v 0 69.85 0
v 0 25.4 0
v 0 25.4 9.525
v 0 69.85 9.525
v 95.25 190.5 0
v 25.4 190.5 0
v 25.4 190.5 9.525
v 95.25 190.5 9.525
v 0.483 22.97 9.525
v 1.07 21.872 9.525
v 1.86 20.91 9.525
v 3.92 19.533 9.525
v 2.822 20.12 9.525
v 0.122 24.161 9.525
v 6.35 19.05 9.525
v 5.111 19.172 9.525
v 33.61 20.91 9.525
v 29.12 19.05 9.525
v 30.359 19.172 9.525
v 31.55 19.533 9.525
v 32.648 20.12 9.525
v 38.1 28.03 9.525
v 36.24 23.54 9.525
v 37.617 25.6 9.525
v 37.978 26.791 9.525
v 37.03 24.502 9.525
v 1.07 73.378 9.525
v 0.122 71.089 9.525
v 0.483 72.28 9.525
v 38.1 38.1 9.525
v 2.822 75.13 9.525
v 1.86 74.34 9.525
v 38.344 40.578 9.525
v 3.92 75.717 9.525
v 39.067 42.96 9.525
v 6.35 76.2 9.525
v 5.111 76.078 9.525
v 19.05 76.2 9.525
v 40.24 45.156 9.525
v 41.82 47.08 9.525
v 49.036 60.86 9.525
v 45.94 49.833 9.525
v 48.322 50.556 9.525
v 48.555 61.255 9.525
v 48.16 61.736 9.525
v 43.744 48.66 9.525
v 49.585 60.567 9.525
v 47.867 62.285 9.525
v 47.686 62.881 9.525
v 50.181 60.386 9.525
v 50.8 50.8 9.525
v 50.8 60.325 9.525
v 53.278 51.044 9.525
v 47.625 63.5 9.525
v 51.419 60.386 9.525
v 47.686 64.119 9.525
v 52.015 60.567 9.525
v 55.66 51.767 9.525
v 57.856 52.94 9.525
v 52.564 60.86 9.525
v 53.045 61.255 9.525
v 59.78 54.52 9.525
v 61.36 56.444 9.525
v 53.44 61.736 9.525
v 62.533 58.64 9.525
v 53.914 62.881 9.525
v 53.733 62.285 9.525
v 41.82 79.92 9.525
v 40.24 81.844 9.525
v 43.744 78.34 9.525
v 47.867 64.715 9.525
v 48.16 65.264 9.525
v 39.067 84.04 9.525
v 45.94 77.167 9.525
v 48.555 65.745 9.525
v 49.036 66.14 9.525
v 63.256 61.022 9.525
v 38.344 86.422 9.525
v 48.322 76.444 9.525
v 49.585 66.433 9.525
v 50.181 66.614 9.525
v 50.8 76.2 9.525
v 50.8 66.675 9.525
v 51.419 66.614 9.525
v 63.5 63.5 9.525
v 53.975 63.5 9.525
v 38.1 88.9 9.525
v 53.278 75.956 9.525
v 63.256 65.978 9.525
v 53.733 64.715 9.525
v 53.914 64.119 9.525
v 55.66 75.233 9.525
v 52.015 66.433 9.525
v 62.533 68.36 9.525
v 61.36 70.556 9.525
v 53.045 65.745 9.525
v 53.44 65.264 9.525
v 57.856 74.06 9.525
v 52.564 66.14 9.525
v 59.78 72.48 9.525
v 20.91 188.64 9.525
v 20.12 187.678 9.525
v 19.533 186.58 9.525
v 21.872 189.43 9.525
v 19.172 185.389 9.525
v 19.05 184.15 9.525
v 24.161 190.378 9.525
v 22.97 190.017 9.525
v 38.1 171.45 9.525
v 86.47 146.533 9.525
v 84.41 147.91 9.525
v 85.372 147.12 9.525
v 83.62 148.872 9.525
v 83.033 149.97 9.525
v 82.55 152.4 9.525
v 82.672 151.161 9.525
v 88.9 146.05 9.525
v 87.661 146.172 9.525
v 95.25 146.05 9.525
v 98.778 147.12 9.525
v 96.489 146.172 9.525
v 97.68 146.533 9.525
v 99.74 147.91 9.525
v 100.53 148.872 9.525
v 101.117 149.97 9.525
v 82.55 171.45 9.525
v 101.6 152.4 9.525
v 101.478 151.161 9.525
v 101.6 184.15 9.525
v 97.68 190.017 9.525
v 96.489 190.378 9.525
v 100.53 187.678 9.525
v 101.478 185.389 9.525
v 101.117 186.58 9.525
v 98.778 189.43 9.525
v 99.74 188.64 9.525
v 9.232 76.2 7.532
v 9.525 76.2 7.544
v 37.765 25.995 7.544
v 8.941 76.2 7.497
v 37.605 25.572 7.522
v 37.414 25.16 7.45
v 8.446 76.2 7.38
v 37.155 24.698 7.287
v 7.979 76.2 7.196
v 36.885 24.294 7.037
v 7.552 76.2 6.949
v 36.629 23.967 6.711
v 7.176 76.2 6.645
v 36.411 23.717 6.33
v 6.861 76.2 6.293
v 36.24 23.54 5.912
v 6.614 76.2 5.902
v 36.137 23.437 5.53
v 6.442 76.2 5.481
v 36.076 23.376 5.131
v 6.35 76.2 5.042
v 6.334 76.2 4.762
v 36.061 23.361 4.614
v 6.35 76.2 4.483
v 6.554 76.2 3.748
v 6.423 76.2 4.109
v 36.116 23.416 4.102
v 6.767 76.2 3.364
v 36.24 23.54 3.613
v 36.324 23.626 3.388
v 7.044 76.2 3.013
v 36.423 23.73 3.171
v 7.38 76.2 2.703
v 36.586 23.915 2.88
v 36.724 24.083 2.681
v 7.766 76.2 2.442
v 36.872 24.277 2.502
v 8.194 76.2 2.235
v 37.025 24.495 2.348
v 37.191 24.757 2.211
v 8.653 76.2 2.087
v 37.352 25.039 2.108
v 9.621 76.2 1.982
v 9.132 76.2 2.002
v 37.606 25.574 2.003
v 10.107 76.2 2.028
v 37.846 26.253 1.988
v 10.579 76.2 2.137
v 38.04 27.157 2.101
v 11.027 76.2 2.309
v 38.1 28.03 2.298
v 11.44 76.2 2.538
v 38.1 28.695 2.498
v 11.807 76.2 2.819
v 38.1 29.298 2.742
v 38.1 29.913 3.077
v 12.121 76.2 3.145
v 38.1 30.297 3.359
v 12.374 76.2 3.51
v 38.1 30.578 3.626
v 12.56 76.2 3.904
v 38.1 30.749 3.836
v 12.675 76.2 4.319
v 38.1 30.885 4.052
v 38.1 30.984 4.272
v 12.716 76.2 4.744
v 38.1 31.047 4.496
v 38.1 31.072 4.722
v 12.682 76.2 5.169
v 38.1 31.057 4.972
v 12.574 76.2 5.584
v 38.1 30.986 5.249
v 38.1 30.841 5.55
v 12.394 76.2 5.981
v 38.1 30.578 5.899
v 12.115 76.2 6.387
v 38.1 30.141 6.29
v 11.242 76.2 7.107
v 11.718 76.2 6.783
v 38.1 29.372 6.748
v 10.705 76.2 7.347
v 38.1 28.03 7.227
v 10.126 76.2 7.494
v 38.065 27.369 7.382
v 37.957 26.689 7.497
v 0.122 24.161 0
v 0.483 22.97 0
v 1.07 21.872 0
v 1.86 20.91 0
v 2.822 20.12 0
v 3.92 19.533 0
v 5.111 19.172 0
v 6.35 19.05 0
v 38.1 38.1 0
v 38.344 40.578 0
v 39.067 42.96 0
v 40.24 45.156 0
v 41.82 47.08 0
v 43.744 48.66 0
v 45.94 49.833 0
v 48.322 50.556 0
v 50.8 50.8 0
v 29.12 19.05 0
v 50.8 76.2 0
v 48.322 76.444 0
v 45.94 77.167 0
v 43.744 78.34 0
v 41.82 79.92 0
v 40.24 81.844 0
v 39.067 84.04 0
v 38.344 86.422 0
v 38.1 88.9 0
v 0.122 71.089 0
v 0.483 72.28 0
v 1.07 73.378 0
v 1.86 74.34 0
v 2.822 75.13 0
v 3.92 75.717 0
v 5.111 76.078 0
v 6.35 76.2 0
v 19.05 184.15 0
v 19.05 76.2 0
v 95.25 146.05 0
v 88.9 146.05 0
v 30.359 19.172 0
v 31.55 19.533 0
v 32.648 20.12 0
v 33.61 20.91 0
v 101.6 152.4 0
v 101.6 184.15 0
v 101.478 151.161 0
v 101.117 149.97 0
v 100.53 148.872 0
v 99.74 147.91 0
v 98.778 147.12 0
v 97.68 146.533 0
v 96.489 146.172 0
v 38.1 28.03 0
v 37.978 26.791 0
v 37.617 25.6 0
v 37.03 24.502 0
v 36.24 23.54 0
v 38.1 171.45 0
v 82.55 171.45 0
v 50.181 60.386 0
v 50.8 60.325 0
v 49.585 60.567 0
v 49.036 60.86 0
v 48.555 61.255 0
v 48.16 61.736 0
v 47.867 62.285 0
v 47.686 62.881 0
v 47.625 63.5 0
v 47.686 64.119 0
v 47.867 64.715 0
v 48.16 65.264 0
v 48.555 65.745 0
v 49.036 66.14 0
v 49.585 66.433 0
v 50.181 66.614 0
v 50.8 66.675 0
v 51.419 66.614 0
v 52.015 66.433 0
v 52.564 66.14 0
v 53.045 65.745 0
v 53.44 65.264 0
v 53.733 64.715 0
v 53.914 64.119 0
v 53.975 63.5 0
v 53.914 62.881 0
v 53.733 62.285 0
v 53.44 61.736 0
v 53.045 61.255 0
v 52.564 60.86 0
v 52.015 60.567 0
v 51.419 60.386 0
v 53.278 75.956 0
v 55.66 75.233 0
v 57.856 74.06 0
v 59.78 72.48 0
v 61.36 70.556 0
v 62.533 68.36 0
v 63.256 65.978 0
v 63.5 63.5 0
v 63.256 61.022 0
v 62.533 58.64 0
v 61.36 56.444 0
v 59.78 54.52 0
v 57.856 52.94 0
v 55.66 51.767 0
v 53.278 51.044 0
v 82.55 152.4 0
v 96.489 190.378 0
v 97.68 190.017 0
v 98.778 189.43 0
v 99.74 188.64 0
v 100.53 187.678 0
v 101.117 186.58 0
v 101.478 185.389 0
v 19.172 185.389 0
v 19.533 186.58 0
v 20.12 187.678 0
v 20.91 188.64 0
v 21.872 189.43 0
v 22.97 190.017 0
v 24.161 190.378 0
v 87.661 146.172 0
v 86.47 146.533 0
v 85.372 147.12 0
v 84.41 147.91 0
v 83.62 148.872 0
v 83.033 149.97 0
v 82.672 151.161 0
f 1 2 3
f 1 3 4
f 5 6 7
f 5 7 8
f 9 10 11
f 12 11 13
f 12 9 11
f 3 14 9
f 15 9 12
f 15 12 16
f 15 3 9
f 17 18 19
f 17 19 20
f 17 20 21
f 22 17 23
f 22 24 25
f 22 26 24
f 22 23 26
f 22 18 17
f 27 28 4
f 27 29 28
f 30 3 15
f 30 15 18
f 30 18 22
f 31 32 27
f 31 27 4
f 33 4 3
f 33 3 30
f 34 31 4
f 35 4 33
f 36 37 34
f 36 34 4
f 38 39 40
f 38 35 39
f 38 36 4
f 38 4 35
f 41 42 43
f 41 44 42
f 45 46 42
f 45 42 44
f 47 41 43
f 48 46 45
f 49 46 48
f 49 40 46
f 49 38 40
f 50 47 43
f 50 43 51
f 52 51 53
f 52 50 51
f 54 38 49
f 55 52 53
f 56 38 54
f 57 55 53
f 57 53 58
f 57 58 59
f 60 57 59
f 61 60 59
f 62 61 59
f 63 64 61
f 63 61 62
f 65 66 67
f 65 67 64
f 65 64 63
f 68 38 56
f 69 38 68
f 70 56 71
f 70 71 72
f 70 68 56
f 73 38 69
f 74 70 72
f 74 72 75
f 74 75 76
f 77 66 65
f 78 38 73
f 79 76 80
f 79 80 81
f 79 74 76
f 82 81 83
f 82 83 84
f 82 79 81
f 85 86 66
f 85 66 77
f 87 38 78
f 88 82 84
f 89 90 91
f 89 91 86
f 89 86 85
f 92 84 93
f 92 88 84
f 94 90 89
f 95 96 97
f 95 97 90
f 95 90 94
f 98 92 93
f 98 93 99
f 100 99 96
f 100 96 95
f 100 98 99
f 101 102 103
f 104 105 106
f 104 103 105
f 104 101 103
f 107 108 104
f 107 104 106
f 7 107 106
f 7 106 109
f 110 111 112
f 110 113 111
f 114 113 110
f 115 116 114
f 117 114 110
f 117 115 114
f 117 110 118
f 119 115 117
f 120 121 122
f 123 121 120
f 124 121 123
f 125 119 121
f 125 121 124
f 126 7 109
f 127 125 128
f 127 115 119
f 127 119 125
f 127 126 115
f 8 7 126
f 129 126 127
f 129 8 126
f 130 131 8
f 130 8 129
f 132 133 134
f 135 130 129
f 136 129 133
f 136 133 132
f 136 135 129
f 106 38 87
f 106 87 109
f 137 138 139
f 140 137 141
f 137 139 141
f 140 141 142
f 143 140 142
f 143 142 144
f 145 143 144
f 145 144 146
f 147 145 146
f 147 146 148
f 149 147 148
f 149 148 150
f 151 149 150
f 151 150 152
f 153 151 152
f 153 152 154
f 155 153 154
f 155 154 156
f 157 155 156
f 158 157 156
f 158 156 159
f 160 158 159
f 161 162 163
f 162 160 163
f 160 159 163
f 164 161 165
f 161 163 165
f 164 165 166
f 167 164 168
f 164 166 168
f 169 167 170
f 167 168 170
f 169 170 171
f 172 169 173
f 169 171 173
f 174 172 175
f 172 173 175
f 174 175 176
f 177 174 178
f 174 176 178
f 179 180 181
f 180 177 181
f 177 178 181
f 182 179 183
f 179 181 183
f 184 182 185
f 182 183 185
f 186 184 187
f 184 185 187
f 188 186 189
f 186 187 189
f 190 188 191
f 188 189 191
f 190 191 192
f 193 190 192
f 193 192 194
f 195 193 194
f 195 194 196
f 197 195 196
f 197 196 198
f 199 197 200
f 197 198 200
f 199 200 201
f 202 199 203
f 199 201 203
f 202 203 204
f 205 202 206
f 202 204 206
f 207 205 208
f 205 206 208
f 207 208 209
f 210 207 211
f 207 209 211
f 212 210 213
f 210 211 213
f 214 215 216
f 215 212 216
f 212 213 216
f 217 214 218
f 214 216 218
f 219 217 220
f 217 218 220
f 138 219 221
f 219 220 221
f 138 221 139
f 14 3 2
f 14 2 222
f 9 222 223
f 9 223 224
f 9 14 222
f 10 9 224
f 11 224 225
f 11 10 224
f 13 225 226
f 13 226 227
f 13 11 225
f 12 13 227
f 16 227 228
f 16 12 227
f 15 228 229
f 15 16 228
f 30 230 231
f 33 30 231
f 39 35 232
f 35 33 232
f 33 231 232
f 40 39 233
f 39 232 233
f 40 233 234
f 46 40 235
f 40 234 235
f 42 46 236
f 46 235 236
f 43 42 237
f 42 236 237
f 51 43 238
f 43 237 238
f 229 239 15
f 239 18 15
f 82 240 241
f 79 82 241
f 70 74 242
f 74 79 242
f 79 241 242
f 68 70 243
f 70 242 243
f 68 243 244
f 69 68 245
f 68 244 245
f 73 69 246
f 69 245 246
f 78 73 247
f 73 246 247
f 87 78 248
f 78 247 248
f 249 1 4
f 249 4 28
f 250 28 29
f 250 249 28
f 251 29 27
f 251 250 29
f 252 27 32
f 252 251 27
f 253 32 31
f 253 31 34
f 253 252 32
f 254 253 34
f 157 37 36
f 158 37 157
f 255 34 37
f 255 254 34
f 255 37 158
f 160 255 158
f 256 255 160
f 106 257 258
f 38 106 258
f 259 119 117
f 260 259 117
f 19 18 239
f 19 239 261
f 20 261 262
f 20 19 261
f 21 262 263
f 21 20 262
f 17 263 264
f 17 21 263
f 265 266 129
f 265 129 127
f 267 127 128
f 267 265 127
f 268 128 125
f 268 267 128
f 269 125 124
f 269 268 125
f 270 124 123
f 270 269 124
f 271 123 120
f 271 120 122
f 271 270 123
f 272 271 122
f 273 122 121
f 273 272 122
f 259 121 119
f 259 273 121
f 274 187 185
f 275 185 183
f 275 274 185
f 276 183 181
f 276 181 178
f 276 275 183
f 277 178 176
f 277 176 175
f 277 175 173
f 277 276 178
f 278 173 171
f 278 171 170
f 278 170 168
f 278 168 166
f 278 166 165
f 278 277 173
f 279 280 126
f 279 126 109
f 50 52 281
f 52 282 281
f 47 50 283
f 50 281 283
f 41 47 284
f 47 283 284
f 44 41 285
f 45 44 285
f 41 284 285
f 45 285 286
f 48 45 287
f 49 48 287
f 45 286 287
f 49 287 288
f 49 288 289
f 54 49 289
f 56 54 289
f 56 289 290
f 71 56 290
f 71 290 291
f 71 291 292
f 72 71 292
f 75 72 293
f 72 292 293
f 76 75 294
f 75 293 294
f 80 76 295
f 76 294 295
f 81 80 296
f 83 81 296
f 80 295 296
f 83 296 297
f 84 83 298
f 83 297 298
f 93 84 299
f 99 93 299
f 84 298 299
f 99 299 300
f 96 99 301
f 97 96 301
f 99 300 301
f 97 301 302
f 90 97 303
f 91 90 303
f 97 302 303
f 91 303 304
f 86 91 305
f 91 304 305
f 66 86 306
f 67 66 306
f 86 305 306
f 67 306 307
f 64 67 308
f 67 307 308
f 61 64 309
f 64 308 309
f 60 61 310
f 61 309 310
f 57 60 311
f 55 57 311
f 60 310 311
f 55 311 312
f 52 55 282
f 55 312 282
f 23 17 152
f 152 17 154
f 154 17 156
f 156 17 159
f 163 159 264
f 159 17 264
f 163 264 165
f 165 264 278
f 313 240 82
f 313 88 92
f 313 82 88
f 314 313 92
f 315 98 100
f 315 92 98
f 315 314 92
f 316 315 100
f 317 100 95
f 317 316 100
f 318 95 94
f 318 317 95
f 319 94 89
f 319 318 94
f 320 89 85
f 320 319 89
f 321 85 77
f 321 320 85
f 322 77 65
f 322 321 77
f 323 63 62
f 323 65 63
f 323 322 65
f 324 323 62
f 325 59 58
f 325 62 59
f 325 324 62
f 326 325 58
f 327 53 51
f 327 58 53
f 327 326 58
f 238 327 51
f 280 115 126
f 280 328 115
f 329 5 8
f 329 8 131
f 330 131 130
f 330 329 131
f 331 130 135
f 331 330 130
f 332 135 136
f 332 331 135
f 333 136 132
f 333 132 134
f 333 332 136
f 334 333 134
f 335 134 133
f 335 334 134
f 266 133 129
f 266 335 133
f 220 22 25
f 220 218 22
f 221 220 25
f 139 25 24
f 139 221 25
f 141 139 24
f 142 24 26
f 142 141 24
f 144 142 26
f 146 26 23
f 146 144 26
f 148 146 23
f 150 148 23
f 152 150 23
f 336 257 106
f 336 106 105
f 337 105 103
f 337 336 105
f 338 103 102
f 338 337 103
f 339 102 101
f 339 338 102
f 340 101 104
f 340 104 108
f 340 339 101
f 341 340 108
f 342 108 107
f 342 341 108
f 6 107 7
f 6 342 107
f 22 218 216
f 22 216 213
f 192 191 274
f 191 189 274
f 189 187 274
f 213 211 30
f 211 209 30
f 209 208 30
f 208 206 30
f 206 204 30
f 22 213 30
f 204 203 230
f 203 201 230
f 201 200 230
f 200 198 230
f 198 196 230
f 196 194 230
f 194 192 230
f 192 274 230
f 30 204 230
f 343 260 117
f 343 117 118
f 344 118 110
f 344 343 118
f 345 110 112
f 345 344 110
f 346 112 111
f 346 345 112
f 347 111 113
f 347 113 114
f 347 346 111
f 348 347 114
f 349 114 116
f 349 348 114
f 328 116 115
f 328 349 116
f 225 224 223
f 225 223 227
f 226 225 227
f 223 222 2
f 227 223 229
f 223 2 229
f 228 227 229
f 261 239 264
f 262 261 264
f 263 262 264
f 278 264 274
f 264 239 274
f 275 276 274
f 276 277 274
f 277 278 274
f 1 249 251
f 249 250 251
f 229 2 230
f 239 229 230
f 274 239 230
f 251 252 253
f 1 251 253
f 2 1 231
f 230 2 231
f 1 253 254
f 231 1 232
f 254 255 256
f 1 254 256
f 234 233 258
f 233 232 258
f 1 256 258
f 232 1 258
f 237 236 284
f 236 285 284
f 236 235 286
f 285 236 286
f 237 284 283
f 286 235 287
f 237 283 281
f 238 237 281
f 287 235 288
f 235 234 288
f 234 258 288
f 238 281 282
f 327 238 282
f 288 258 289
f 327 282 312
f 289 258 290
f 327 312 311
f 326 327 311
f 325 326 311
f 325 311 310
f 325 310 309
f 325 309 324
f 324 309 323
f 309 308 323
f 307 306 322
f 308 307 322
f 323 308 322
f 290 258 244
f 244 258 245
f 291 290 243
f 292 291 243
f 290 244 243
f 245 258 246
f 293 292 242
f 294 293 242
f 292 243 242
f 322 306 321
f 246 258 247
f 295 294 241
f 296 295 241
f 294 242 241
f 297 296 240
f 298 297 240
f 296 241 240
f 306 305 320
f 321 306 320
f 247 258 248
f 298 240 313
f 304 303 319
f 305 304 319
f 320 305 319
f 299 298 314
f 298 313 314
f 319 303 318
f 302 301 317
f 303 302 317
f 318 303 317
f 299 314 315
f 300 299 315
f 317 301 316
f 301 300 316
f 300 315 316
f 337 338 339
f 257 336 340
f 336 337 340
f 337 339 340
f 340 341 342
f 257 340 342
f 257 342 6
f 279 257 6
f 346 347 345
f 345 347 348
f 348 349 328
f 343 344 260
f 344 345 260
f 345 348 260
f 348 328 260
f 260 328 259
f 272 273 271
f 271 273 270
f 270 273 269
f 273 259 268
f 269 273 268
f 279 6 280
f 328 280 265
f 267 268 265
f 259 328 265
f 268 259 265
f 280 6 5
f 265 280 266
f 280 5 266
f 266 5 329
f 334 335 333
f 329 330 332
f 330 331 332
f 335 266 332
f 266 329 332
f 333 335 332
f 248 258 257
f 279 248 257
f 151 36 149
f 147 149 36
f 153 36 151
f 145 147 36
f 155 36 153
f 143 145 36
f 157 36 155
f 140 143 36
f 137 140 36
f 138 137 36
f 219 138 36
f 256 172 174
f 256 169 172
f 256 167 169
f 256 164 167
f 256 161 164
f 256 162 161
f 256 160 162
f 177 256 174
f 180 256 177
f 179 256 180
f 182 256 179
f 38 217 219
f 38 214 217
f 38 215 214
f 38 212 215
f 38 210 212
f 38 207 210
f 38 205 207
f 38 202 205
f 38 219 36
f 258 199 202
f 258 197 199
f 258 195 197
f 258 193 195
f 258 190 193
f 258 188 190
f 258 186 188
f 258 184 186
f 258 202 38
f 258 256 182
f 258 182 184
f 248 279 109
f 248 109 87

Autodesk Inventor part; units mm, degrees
ref_plane "YZ Plane" through (0, 0, 0) normal (1, 0, 0) x (0, 1, 0)
ref_plane "XZ Plane" through (0, 0, 0) normal (0, 1, 0) x (-1, 0, 0)
sketch "Sketch1" plane through (0, 0, 0) normal (0, 0, 1) x (1, 0, 0)
  line L0 (0, 0) -> (12.7, 0)
  line L1 (12.7, 0) -> (38.1, 25.4)
  line L2 (38.1, 25.4) -> (38.1, 38.1)
  arc A0 (50.8, 50.8) -> (38.1, 38.1) centre (50.8, 38.1) ccw
  line L3 (0, 0) -> (0, 76.2)
  line L4 (0, 76.2) -> (19.05, 76.2)
  line L5 (19.05, 190.5) -> (19.05, 76.2)
  line L6 (38.1, 171.45) -> (38.1, 88.9)
  arc A1 (50.8, 50.8) -> (50.8, 76.2) centre (50.8, 63.5) ccw
  arc A2 (38.1, 88.9) -> (50.8, 76.2) centre (50.8, 88.9) ccw
  line L7 (19.05, 190.5) -> (101.6, 190.5)
  line L8 (82.55, 171.45) -> (38.1, 171.45)
  line L9 (101.6, 190.5) -> (101.6, 146.05)
  line L10 (101.6, 146.05) -> (82.55, 146.05)
  line L11 (82.55, 146.05) -> (82.55, 171.45)
  dimension "d1" = 25.4
  dimension "d2" = 25.4
  dimension "d3" = 12.7
  dimension "d38" = 76.2
  dimension "d41" = 38.1
  dimension "d84" = 12.7
  dimension "d85" = 12.7
  dimension "d87" = 0
  dimension "d88" = 12.7
  dimension "d90" = 19.05
  dimension "d100" = 19.05
  dimension "d101" = 19.05
  dimension "d102" = 19.05
  dimension "d103" = 107.95
  dimension "d104" = 44.45
  dimension "d105" = 25.4
extrude "Extrusion1" add sketch "Sketch1" along normal blind 9.525
sketch "Sketch3" plane through (0, 0, 9.525) normal (0, 0, 1) x (1, 0, 0)
  line L0 (0, 76.2) -> (0, 0) projected
  line L1 (0, 0) -> (12.7, 0) projected
  arc A0 (50.8, 50.8) -> (38.1, 38.1) centre (50.8, 38.1) ccw projected
  line L2 (19.05, 76.2) -> (0, 76.2) projected
  point P0 (50.8, 63.5)
  point P1 (49.53, 54.61)
  point P2 (12.7, 82.55)
  dimension "d39" = 0
  dimension "d40" = 12.7
hole "Hole2" at (50.8, 63.5, 9.525) direction (0, 0, -1) diameter 6.35 end through all
sketch "Sketch7" plane through (0, 76.2, 0) normal (0, 1, 0) x (1, 0, 0)
  line L0 (0, 0) -> (0, -9.525) projected
  point P0 (9.525, -4.7625)
  dimension "d77" = 9.525
ref_plane "Work Plane6" through (38.1, 25.4, 0) normal (-0.4902612, 0.8715755, 0) x (0, 0, 1)
ref_plane "Work Plane5" through (38.1, 25.4, 4.7625) normal (0.8715755, 0.4902612, 0) x (-0.4902612, 0.8715755, 0)
sketch "Sketch8" plane through (38.1, 25.4, 0) normal (-0.4902612, 0.8715755, 0) x (0, 0, 1)
  line L0 (0, 0) -> (9.525, 0) projected
  circle A0 centre (4.7625, 0) radius 2.7813
  point P0 (0, -45.6597)
  dimension "d79" = 5.5626
extrude "Extrusion3" cut sketch "Sketch8" along normal through all both and the other way through all
sketch "Sketch10" plane through (0, 0, 9.525) normal (0, 0, 1) x (1, 0, 0)
  circle A0 centre (50.8, 63.5) radius 3.175 projected
  line L0 (0, 0) -> (12.7, 0) projected
  line L1 (12.7, 0) -> (38.1, 25.4) projected
  line L2 (38.1, 25.4) -> (38.1, 38.1) projected
  arc A1 (50.8, 50.8) -> (38.1, 38.1) centre (50.8, 38.1) ccw projected
  arc A2 (50.8, 50.8) -> (50.8, 76.2) centre (50.8, 63.5) ccw projected
  arc A3 (38.1, 88.9) -> (50.8, 76.2) centre (50.8, 88.9) ccw projected
  line L3 (38.1, 88.9) -> (38.1, 171.45) projected
  line L4 (19.05, 190.5) -> (19.05, 76.2) projected
  line L5 (19.05, 76.2) -> (0, 76.2) projected
  line L6 (0, 76.2) -> (0, 0) projected
  line L7 (12.7, 0) -> (38.1, 25.4) projected
  line L8 (31.75, 19.05) -> (0, 19.05)
  line L9 (38.1, 171.45) -> (82.55, 171.45) projected
  line L10 (82.55, 171.45) -> (82.55, 146.05) projected
  line L11 (82.55, 146.05) -> (101.6, 146.05) projected
  line L12 (101.6, 146.05) -> (101.6, 190.5) projected
  line L13 (101.6, 190.5) -> (19.05, 190.5) projected
  dimension "d95" = 6.35
extrude "Extrusion5" cut sketch "Sketch10" against normal through all contours L6 L8 L1 L0
fillet "Fillet6" radius 6.35 9 edges at (0, 76.2, 4.7625) (0, 19.05, 4.7625) (31.75, 19.05, 4.7625) (38.1, 25.4, 8.5344) (38.1, 25.4, 0.9906) (19.05, 190.5, 4.7625) (101.6, 190.5, 4.7625) (82.55, 146.05, 4.7625) (101.6, 146.05, 4.7625)
properties part number "CLB_079_ScissorHookV2"
